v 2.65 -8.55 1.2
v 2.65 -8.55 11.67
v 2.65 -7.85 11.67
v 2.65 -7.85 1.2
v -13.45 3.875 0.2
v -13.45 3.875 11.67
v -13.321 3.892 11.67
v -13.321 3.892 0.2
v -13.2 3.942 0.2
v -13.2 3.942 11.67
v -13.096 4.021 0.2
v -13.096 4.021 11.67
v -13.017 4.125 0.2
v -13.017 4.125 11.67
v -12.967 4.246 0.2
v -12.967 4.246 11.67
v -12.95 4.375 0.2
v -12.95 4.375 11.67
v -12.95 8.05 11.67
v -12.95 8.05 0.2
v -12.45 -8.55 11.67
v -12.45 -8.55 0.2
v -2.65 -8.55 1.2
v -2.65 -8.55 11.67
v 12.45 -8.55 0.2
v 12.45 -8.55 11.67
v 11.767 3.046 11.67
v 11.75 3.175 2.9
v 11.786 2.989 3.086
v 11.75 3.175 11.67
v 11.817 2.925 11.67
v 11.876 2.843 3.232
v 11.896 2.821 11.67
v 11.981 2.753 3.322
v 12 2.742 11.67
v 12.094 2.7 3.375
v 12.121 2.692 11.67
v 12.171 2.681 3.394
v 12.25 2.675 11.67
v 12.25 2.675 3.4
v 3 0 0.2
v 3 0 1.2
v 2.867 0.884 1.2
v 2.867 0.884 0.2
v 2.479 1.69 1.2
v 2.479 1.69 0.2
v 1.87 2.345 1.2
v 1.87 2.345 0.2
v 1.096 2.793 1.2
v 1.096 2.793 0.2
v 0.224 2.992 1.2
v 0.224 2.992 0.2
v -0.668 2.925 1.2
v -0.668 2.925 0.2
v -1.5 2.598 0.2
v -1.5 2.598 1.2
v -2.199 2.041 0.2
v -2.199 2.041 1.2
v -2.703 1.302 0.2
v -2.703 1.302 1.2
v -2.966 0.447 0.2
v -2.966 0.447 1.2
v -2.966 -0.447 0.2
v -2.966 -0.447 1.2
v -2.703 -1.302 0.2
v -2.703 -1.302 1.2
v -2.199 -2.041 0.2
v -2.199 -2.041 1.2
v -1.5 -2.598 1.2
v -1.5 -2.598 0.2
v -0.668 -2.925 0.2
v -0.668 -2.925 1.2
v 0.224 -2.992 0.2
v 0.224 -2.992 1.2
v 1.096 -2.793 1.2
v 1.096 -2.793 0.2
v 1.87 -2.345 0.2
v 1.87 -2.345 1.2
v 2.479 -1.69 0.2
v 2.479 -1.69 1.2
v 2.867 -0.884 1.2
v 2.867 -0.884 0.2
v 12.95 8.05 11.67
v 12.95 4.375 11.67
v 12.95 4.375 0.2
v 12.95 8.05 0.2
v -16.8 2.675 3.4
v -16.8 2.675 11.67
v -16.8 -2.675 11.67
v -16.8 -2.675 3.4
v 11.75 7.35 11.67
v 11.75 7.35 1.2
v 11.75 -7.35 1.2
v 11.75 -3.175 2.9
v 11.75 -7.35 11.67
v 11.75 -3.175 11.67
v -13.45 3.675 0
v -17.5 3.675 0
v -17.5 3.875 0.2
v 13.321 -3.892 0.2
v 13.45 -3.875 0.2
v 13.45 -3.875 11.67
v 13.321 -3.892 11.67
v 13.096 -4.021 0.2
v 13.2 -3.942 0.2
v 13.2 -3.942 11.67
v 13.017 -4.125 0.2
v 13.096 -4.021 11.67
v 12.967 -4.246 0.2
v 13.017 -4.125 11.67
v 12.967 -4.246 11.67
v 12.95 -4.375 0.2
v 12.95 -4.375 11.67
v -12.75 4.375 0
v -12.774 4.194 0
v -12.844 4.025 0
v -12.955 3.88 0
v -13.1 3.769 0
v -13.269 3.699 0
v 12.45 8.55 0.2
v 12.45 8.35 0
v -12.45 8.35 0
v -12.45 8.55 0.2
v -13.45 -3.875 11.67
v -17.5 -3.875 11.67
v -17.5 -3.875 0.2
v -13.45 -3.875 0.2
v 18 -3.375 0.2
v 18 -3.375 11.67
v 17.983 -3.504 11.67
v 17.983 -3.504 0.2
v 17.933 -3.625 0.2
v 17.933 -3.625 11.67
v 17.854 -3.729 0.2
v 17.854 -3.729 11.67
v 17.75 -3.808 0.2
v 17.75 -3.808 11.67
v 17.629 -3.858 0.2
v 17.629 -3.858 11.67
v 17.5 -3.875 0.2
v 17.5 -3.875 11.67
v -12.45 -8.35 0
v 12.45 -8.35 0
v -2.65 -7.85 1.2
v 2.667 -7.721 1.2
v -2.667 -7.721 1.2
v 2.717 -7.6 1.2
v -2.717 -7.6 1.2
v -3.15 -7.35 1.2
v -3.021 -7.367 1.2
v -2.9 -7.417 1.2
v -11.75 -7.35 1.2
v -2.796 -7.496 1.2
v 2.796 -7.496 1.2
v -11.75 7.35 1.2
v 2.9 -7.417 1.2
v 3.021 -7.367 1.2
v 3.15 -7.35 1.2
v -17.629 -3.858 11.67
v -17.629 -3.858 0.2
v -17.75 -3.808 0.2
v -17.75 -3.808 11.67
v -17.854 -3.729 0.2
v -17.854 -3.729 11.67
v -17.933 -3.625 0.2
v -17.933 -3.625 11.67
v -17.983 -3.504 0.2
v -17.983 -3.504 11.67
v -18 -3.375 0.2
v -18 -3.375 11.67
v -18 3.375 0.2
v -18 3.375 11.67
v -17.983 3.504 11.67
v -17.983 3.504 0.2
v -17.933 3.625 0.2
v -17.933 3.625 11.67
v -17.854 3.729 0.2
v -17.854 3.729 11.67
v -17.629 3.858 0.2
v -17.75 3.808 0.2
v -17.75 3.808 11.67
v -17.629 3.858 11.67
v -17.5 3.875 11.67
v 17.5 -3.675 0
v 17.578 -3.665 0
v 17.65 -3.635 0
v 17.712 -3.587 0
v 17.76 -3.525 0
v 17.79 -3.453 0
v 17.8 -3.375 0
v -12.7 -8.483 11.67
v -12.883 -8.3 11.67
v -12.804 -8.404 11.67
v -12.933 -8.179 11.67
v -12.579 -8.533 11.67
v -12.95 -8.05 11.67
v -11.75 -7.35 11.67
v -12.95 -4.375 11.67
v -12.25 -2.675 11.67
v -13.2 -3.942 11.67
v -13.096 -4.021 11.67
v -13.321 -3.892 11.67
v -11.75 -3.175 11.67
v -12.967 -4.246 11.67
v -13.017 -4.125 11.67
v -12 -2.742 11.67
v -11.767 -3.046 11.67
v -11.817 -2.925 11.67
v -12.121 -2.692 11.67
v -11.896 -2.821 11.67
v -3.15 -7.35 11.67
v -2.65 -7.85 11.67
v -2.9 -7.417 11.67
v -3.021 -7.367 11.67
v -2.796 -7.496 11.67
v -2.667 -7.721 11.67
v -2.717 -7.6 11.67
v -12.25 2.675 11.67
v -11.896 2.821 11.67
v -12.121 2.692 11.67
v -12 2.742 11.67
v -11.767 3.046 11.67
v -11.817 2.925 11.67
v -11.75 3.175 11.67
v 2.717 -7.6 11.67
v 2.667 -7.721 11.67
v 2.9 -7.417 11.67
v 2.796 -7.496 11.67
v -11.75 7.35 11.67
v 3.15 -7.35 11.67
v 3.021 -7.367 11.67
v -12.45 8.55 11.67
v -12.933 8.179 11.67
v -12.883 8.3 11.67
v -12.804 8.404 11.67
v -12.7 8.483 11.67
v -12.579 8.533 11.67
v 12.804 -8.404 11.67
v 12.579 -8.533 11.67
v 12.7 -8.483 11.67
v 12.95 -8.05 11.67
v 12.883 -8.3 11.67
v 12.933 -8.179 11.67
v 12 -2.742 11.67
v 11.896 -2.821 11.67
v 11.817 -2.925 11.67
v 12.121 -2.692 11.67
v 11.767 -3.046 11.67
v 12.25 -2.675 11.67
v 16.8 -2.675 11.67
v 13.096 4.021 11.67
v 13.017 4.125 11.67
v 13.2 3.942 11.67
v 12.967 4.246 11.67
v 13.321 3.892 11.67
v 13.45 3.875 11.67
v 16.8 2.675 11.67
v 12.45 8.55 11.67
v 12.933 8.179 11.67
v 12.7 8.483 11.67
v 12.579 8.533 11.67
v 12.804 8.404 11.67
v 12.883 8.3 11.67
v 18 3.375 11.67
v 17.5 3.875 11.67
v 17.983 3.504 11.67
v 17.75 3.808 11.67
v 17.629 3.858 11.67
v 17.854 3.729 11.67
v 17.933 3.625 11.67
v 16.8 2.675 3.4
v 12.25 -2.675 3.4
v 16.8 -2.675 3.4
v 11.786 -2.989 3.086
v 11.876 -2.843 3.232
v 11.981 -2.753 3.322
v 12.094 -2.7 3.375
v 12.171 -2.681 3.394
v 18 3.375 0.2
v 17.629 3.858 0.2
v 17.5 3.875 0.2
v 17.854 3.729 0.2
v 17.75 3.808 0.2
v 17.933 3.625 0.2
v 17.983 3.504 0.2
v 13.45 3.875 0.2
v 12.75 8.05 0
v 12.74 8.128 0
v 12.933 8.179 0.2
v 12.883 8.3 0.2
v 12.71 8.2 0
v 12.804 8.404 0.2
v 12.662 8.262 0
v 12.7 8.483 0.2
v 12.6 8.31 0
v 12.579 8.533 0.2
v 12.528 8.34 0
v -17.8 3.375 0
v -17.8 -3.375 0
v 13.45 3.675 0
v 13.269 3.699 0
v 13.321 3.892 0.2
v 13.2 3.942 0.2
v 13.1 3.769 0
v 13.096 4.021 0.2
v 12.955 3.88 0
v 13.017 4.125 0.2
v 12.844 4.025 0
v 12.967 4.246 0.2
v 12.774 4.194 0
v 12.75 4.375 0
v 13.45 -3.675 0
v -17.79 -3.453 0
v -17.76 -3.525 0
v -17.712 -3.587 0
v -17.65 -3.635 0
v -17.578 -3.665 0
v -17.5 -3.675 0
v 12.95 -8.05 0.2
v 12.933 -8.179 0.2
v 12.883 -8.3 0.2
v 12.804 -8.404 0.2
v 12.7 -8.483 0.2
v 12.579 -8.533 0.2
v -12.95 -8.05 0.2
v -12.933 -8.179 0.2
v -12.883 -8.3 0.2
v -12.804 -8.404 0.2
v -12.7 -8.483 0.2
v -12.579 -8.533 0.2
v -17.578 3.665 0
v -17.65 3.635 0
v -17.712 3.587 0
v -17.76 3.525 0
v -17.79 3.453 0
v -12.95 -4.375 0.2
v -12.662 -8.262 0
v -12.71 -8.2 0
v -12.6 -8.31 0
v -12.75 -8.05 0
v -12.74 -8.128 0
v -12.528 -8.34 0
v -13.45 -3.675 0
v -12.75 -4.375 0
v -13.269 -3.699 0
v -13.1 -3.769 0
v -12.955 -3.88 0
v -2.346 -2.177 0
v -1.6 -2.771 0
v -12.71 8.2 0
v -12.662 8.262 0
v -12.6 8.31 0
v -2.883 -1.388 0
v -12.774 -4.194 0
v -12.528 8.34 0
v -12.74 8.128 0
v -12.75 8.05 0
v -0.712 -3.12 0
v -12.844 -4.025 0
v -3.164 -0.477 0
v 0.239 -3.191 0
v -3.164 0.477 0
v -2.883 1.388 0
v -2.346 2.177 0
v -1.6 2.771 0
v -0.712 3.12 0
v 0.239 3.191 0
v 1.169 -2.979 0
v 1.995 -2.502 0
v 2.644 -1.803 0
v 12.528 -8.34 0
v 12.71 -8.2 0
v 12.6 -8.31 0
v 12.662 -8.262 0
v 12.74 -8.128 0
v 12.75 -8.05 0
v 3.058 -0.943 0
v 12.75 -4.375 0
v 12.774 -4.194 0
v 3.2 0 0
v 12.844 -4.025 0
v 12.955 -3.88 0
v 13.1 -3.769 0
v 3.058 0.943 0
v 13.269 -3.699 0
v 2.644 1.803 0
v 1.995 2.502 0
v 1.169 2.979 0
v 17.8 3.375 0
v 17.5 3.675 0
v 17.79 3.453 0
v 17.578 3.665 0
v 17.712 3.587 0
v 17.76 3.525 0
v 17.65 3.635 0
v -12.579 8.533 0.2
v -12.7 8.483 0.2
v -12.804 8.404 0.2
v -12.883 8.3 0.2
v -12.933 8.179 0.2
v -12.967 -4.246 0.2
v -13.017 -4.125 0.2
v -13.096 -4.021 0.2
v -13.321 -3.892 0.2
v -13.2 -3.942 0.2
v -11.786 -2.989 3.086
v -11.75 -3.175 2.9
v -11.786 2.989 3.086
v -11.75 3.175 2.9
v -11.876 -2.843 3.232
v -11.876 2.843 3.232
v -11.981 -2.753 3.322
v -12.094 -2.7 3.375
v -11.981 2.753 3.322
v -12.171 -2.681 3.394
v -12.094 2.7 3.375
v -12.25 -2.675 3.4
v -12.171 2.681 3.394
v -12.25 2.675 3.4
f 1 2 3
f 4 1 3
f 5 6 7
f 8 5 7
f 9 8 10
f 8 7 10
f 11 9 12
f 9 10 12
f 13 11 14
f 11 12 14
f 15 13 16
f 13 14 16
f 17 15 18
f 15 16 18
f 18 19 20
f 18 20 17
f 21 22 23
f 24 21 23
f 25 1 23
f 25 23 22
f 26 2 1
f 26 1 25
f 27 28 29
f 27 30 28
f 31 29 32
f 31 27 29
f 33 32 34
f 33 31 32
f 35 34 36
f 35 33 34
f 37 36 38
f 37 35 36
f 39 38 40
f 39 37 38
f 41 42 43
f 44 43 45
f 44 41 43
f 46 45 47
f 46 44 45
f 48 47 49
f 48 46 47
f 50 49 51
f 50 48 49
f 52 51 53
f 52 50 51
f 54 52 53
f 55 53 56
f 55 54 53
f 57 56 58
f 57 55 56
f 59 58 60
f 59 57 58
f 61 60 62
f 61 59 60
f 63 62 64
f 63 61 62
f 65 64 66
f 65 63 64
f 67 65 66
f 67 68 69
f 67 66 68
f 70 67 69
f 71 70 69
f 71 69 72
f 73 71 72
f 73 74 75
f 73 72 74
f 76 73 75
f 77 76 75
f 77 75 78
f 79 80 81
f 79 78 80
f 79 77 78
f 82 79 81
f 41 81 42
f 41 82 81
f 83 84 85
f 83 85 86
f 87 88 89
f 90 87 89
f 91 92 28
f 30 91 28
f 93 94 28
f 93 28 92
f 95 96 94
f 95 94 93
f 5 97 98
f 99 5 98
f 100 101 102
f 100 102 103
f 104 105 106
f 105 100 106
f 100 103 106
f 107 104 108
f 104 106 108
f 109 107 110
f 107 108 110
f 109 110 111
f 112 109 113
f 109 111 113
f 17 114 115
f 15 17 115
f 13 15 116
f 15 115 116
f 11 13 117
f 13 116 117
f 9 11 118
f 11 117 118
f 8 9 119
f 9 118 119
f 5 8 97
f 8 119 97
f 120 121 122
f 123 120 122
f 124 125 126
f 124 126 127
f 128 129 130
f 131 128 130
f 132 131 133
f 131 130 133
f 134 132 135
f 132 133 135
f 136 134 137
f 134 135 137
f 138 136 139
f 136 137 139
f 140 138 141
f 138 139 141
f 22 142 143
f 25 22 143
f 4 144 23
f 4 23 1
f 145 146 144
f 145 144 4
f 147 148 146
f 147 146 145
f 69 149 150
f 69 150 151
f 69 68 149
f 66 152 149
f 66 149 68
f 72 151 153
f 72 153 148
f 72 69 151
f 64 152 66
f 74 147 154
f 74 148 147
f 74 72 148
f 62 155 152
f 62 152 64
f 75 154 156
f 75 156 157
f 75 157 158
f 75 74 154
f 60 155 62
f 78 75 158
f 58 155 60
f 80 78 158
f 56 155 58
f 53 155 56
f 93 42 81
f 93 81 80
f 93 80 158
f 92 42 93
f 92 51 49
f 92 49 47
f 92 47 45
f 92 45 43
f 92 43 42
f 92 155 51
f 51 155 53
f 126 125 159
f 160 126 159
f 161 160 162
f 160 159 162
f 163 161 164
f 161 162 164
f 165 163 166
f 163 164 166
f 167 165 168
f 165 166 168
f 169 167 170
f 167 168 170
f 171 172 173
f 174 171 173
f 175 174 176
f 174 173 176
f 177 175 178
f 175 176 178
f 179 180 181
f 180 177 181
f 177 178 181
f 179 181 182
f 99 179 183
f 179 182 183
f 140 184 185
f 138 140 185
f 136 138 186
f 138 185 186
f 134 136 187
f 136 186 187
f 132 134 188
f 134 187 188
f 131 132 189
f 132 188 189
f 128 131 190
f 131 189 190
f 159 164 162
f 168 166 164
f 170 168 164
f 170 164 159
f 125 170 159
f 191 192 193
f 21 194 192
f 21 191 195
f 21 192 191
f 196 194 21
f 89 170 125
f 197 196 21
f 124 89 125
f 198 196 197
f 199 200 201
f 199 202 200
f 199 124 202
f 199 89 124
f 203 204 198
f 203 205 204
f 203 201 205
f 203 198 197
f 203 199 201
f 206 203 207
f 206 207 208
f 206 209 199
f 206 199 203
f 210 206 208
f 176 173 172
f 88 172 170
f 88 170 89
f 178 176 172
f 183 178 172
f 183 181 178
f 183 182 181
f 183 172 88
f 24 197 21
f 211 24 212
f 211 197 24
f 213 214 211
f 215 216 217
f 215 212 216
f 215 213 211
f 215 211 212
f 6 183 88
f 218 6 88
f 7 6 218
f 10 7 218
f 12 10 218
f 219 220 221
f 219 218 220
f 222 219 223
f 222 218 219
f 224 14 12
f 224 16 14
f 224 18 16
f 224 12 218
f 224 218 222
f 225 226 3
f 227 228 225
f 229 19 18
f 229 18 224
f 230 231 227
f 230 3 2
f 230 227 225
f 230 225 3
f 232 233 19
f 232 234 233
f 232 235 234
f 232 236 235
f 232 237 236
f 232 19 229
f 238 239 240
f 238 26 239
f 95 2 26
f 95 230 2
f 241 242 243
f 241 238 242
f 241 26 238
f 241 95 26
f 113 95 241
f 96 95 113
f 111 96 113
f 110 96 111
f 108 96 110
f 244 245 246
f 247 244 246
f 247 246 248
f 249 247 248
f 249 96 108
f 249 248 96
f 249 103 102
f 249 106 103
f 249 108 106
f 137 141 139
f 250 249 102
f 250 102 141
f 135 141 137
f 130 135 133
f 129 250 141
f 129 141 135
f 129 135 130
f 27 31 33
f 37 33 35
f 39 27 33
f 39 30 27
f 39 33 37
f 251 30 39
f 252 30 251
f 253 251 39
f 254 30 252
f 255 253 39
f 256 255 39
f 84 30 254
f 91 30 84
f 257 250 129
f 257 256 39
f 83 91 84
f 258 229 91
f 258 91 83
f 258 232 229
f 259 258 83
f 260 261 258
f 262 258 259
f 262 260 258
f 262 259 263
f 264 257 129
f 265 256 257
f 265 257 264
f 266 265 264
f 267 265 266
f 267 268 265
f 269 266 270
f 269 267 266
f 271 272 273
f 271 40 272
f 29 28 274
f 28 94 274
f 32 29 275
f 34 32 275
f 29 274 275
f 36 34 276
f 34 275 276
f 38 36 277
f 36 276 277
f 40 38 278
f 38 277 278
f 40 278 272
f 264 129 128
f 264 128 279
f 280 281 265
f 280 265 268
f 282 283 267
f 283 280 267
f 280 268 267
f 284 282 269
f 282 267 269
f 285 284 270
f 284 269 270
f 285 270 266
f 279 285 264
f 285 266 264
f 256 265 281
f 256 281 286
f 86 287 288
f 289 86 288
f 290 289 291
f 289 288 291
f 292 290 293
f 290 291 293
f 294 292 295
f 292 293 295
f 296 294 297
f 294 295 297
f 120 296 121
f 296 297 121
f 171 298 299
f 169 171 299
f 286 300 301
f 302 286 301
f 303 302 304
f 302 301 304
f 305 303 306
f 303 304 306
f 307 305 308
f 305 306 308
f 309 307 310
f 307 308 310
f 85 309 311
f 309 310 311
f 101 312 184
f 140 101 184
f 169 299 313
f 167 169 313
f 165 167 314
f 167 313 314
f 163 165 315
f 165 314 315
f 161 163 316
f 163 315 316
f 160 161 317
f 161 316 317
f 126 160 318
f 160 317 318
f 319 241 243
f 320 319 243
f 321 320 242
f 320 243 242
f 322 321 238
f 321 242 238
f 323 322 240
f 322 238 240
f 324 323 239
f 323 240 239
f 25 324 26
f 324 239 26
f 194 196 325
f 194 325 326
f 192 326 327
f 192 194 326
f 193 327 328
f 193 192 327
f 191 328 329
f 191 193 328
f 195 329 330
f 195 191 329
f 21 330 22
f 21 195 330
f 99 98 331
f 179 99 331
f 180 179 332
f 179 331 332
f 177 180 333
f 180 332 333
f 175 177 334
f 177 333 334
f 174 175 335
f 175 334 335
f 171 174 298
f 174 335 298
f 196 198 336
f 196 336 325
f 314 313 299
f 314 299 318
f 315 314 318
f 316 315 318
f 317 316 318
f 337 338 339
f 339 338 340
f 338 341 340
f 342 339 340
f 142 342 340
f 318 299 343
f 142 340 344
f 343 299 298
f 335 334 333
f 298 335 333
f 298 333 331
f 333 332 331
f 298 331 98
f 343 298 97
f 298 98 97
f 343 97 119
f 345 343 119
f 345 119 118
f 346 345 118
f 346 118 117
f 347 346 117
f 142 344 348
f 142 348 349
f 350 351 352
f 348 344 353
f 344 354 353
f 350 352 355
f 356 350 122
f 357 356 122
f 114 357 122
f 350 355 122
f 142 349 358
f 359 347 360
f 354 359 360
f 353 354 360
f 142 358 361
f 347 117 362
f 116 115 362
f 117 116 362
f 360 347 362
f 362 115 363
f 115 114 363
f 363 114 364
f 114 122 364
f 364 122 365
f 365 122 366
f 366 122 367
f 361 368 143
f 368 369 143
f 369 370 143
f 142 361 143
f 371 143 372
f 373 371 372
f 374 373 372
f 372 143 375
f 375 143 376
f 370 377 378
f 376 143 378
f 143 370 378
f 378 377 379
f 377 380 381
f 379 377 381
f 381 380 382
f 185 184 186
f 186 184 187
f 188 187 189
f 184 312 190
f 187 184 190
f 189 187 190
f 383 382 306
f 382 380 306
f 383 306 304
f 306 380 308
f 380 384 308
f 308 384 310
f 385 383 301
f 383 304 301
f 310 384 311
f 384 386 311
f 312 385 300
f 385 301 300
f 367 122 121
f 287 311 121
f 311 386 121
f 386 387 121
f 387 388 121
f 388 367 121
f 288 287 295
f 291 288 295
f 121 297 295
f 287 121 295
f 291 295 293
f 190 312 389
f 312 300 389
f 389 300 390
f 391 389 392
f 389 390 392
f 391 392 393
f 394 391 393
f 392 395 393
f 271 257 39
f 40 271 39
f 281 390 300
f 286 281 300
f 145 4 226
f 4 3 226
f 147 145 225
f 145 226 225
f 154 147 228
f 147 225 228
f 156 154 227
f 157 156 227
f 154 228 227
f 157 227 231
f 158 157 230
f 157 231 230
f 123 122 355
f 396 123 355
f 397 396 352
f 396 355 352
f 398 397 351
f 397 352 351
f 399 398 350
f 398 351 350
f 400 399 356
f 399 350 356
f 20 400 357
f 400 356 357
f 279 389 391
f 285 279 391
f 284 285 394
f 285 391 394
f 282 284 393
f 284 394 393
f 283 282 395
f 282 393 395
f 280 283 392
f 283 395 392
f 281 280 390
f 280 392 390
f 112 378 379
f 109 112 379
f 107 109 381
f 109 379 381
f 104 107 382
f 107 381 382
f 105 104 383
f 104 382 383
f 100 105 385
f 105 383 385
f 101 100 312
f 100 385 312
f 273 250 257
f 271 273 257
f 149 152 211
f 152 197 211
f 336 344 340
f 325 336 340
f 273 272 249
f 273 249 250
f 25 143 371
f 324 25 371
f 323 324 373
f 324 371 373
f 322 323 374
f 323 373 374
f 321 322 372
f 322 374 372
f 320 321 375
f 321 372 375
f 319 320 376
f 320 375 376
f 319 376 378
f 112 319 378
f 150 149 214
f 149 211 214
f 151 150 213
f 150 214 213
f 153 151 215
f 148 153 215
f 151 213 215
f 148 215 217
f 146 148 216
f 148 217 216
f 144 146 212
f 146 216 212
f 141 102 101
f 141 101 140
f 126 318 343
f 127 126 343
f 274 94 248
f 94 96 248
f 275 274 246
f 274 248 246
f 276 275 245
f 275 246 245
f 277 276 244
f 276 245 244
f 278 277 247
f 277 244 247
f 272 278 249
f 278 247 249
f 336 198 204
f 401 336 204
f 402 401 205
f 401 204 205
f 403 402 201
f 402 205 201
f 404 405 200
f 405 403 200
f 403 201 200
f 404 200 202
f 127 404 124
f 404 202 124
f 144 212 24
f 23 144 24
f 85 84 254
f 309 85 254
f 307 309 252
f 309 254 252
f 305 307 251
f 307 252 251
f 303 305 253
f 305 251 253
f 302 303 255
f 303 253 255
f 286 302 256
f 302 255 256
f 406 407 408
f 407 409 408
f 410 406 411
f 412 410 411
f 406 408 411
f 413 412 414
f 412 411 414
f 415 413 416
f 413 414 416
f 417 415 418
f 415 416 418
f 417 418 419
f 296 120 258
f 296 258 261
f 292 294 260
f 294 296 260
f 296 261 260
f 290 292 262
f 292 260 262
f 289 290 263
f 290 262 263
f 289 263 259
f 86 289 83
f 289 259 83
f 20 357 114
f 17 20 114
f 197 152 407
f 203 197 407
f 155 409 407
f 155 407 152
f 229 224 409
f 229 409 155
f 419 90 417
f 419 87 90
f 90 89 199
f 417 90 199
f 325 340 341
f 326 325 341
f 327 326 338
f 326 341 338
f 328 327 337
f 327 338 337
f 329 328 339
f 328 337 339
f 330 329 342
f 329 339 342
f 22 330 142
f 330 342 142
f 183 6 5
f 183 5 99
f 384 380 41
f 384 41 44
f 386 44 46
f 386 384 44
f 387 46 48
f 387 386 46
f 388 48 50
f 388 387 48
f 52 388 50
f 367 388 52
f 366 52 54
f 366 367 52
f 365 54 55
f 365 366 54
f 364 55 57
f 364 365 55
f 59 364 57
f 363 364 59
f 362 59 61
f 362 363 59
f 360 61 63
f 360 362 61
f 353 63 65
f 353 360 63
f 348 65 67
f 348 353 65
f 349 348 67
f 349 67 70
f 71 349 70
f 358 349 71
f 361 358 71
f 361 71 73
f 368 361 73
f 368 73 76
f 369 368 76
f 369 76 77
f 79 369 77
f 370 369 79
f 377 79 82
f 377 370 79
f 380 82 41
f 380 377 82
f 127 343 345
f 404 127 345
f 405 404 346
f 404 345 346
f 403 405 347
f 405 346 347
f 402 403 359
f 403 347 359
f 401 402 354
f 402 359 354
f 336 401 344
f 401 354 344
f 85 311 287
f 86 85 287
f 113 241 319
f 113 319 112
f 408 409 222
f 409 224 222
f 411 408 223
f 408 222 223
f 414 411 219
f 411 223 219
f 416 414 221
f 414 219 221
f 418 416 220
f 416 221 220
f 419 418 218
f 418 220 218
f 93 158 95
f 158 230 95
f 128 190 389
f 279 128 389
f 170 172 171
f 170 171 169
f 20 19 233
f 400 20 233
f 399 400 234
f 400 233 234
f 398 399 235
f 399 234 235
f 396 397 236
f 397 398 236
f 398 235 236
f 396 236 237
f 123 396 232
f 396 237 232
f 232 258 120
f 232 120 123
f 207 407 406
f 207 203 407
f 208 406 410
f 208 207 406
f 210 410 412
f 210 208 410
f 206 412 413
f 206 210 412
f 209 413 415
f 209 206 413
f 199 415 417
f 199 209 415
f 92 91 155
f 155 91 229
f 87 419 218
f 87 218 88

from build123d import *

# Parameters (mm, degrees)
F4_W      = 5.05
F4_H      = 5.35
F9_R      = 3
F10_DEPTH = 11.671
F11_R     = 0.5
F12_SIZE  = 0.2


with BuildPart() as f6:
    # F6: sweep along a path in F1
    with BuildLine(Plane.XZ) as f6_path:
        Line((0, 0), (0, 1.2))
        Line((0, 1.2), (0, 3.4))
        Line((0, 3.4), (0, 4.67))
        Line((0, 4.67), (0, 11.67))
    # F5 (on Top) → F6 (sweep)
    with BuildSketch(Plane.XY):
        Polygon((-12.95, -8.55), (0, -8.55), (12.95, -8.55), (12.95, -3.875), (18, -3.875), (18, 3.875), (12.95, 3.875), (12.95, 8.55), (-12.95, 8.55), (-12.95, 3.875), (-18, 3.875), (-18, -3.875), (-12.95, -3.875), align=None)
    sweep(path=f6_path.line)

    # F7: sweep along a path in F1
    with BuildLine(Plane.XZ) as f7_path:
        Line((0, 1.2), (0, 3.4))
        Line((0, 3.4), (0, 4.67))
        Line((0, 4.67), (0, 11.67))
    # F4 (on line) → F7 (sweep, cut)
    with BuildSketch(Plane.XY.offset(1.2)):
        Polygon((11.75, 2.675), (11.75, 7.35), (-11.75, 7.35), (-11.75, 2.675), (-11.75, -2.675), (-11.75, -7.35), (-2.65, -7.35), (-2.65, -16.2557040095), (2.65, -16.2557040095), (2.65, -7.35), (11.75, -7.35), (11.75, -2.675), align=None)
        with Locations((14.275, 0)):
            Rectangle(F4_W, F4_H)
        with Locations((-14.275, 0)):
            Rectangle(F4_W, F4_H)
    sweep(path=f7_path.line, mode=Mode.SUBTRACT)

    # F8: sweep along a path in F1
    with BuildLine(Plane.XZ) as f8_path:
        Line((0, 1.2), (0, 3.4))
    # F4 (on line) → F8 (sweep)
    with BuildSketch(Plane.XY.offset(1.2)):
        with Locations((-14.275, 0)):
            Rectangle(F4_W, F4_H)
        with Locations((14.275, 0)):
            Rectangle(F4_W, F4_H)
    sweep(path=f8_path.line)

    # F9 (on Top) → F10 (cut, through all)
    with BuildSketch(Plane.XY):
        Circle(F9_R)
    extrude(amount=F10_DEPTH, mode=Mode.SUBTRACT)

    # F11
    f11_edges = [f6.edges().sort_by_distance(p)[0] for p in [
        (-2.65, -7.35, 6.435),
        (2.65, -7.35, 6.435),
        (-11.75, 0, 3.4),
        (11.75, 0, 3.4),
        (18, -3.875, 5.835),
        (18, 3.875, 5.835),
        (12.95, -8.55, 5.835),
        (12.95, 8.55, 5.835),
        (-12.95, -8.55, 5.835),
        (-18, -3.875, 5.835),
        (-12.95, 8.55, 5.835),
        (-18, 3.875, 5.835),
        (12.95, 3.875, 5.835),
        (12.95, -3.875, 5.835),
        (-12.95, -3.875, 5.835),
        (-12.95, 3.875, 5.835),
        (11.75, 2.675, 7.535),
        (11.75, -2.675, 7.535),
        (-11.75, -2.675, 7.535),
        (-11.75, 2.675, 7.535),
    ]]
    fillet(f11_edges, radius=F11_R)

    # F12
    f12_edges = [f6.edges().sort_by_distance(p)[0] for p in [
        (0, -8.55, 0),
        (-12.803553, -8.403553, 0),
        (12.803553, -8.403553, 0),
        (-12.95, -6.2125, 0),
        (12.95, -6.2125, 0),
        (-13.096447, -4.021447, 0),
        (13.096447, -4.021447, 0),
        (-15.475, -3.875, 0),
        (15.475, -3.875, 0),
        (-17.853553, -3.728553, 0),
        (17.853553, -3.728553, 0),
        (-18, 0, 0),
        (18, 0, 0),
        (-17.853553, 3.728553, 0),
        (17.853553, 3.728553, 0),
        (-15.475, 3.875, 0),
        (15.475, 3.875, 0),
        (-13.096447, 4.021447, 0),
        (13.096447, 4.021447, 0),
        (-12.95, 6.2125, 0),
        (12.95, 6.2125, 0),
        (-12.803553, 8.403553, 0),
        (12.803553, 8.403553, 0),
        (0, 8.55, 0),
        (-3, 0, 0),
    ]]
    chamfer(f12_edges, length=F12_SIZE)


solid = f6.part
